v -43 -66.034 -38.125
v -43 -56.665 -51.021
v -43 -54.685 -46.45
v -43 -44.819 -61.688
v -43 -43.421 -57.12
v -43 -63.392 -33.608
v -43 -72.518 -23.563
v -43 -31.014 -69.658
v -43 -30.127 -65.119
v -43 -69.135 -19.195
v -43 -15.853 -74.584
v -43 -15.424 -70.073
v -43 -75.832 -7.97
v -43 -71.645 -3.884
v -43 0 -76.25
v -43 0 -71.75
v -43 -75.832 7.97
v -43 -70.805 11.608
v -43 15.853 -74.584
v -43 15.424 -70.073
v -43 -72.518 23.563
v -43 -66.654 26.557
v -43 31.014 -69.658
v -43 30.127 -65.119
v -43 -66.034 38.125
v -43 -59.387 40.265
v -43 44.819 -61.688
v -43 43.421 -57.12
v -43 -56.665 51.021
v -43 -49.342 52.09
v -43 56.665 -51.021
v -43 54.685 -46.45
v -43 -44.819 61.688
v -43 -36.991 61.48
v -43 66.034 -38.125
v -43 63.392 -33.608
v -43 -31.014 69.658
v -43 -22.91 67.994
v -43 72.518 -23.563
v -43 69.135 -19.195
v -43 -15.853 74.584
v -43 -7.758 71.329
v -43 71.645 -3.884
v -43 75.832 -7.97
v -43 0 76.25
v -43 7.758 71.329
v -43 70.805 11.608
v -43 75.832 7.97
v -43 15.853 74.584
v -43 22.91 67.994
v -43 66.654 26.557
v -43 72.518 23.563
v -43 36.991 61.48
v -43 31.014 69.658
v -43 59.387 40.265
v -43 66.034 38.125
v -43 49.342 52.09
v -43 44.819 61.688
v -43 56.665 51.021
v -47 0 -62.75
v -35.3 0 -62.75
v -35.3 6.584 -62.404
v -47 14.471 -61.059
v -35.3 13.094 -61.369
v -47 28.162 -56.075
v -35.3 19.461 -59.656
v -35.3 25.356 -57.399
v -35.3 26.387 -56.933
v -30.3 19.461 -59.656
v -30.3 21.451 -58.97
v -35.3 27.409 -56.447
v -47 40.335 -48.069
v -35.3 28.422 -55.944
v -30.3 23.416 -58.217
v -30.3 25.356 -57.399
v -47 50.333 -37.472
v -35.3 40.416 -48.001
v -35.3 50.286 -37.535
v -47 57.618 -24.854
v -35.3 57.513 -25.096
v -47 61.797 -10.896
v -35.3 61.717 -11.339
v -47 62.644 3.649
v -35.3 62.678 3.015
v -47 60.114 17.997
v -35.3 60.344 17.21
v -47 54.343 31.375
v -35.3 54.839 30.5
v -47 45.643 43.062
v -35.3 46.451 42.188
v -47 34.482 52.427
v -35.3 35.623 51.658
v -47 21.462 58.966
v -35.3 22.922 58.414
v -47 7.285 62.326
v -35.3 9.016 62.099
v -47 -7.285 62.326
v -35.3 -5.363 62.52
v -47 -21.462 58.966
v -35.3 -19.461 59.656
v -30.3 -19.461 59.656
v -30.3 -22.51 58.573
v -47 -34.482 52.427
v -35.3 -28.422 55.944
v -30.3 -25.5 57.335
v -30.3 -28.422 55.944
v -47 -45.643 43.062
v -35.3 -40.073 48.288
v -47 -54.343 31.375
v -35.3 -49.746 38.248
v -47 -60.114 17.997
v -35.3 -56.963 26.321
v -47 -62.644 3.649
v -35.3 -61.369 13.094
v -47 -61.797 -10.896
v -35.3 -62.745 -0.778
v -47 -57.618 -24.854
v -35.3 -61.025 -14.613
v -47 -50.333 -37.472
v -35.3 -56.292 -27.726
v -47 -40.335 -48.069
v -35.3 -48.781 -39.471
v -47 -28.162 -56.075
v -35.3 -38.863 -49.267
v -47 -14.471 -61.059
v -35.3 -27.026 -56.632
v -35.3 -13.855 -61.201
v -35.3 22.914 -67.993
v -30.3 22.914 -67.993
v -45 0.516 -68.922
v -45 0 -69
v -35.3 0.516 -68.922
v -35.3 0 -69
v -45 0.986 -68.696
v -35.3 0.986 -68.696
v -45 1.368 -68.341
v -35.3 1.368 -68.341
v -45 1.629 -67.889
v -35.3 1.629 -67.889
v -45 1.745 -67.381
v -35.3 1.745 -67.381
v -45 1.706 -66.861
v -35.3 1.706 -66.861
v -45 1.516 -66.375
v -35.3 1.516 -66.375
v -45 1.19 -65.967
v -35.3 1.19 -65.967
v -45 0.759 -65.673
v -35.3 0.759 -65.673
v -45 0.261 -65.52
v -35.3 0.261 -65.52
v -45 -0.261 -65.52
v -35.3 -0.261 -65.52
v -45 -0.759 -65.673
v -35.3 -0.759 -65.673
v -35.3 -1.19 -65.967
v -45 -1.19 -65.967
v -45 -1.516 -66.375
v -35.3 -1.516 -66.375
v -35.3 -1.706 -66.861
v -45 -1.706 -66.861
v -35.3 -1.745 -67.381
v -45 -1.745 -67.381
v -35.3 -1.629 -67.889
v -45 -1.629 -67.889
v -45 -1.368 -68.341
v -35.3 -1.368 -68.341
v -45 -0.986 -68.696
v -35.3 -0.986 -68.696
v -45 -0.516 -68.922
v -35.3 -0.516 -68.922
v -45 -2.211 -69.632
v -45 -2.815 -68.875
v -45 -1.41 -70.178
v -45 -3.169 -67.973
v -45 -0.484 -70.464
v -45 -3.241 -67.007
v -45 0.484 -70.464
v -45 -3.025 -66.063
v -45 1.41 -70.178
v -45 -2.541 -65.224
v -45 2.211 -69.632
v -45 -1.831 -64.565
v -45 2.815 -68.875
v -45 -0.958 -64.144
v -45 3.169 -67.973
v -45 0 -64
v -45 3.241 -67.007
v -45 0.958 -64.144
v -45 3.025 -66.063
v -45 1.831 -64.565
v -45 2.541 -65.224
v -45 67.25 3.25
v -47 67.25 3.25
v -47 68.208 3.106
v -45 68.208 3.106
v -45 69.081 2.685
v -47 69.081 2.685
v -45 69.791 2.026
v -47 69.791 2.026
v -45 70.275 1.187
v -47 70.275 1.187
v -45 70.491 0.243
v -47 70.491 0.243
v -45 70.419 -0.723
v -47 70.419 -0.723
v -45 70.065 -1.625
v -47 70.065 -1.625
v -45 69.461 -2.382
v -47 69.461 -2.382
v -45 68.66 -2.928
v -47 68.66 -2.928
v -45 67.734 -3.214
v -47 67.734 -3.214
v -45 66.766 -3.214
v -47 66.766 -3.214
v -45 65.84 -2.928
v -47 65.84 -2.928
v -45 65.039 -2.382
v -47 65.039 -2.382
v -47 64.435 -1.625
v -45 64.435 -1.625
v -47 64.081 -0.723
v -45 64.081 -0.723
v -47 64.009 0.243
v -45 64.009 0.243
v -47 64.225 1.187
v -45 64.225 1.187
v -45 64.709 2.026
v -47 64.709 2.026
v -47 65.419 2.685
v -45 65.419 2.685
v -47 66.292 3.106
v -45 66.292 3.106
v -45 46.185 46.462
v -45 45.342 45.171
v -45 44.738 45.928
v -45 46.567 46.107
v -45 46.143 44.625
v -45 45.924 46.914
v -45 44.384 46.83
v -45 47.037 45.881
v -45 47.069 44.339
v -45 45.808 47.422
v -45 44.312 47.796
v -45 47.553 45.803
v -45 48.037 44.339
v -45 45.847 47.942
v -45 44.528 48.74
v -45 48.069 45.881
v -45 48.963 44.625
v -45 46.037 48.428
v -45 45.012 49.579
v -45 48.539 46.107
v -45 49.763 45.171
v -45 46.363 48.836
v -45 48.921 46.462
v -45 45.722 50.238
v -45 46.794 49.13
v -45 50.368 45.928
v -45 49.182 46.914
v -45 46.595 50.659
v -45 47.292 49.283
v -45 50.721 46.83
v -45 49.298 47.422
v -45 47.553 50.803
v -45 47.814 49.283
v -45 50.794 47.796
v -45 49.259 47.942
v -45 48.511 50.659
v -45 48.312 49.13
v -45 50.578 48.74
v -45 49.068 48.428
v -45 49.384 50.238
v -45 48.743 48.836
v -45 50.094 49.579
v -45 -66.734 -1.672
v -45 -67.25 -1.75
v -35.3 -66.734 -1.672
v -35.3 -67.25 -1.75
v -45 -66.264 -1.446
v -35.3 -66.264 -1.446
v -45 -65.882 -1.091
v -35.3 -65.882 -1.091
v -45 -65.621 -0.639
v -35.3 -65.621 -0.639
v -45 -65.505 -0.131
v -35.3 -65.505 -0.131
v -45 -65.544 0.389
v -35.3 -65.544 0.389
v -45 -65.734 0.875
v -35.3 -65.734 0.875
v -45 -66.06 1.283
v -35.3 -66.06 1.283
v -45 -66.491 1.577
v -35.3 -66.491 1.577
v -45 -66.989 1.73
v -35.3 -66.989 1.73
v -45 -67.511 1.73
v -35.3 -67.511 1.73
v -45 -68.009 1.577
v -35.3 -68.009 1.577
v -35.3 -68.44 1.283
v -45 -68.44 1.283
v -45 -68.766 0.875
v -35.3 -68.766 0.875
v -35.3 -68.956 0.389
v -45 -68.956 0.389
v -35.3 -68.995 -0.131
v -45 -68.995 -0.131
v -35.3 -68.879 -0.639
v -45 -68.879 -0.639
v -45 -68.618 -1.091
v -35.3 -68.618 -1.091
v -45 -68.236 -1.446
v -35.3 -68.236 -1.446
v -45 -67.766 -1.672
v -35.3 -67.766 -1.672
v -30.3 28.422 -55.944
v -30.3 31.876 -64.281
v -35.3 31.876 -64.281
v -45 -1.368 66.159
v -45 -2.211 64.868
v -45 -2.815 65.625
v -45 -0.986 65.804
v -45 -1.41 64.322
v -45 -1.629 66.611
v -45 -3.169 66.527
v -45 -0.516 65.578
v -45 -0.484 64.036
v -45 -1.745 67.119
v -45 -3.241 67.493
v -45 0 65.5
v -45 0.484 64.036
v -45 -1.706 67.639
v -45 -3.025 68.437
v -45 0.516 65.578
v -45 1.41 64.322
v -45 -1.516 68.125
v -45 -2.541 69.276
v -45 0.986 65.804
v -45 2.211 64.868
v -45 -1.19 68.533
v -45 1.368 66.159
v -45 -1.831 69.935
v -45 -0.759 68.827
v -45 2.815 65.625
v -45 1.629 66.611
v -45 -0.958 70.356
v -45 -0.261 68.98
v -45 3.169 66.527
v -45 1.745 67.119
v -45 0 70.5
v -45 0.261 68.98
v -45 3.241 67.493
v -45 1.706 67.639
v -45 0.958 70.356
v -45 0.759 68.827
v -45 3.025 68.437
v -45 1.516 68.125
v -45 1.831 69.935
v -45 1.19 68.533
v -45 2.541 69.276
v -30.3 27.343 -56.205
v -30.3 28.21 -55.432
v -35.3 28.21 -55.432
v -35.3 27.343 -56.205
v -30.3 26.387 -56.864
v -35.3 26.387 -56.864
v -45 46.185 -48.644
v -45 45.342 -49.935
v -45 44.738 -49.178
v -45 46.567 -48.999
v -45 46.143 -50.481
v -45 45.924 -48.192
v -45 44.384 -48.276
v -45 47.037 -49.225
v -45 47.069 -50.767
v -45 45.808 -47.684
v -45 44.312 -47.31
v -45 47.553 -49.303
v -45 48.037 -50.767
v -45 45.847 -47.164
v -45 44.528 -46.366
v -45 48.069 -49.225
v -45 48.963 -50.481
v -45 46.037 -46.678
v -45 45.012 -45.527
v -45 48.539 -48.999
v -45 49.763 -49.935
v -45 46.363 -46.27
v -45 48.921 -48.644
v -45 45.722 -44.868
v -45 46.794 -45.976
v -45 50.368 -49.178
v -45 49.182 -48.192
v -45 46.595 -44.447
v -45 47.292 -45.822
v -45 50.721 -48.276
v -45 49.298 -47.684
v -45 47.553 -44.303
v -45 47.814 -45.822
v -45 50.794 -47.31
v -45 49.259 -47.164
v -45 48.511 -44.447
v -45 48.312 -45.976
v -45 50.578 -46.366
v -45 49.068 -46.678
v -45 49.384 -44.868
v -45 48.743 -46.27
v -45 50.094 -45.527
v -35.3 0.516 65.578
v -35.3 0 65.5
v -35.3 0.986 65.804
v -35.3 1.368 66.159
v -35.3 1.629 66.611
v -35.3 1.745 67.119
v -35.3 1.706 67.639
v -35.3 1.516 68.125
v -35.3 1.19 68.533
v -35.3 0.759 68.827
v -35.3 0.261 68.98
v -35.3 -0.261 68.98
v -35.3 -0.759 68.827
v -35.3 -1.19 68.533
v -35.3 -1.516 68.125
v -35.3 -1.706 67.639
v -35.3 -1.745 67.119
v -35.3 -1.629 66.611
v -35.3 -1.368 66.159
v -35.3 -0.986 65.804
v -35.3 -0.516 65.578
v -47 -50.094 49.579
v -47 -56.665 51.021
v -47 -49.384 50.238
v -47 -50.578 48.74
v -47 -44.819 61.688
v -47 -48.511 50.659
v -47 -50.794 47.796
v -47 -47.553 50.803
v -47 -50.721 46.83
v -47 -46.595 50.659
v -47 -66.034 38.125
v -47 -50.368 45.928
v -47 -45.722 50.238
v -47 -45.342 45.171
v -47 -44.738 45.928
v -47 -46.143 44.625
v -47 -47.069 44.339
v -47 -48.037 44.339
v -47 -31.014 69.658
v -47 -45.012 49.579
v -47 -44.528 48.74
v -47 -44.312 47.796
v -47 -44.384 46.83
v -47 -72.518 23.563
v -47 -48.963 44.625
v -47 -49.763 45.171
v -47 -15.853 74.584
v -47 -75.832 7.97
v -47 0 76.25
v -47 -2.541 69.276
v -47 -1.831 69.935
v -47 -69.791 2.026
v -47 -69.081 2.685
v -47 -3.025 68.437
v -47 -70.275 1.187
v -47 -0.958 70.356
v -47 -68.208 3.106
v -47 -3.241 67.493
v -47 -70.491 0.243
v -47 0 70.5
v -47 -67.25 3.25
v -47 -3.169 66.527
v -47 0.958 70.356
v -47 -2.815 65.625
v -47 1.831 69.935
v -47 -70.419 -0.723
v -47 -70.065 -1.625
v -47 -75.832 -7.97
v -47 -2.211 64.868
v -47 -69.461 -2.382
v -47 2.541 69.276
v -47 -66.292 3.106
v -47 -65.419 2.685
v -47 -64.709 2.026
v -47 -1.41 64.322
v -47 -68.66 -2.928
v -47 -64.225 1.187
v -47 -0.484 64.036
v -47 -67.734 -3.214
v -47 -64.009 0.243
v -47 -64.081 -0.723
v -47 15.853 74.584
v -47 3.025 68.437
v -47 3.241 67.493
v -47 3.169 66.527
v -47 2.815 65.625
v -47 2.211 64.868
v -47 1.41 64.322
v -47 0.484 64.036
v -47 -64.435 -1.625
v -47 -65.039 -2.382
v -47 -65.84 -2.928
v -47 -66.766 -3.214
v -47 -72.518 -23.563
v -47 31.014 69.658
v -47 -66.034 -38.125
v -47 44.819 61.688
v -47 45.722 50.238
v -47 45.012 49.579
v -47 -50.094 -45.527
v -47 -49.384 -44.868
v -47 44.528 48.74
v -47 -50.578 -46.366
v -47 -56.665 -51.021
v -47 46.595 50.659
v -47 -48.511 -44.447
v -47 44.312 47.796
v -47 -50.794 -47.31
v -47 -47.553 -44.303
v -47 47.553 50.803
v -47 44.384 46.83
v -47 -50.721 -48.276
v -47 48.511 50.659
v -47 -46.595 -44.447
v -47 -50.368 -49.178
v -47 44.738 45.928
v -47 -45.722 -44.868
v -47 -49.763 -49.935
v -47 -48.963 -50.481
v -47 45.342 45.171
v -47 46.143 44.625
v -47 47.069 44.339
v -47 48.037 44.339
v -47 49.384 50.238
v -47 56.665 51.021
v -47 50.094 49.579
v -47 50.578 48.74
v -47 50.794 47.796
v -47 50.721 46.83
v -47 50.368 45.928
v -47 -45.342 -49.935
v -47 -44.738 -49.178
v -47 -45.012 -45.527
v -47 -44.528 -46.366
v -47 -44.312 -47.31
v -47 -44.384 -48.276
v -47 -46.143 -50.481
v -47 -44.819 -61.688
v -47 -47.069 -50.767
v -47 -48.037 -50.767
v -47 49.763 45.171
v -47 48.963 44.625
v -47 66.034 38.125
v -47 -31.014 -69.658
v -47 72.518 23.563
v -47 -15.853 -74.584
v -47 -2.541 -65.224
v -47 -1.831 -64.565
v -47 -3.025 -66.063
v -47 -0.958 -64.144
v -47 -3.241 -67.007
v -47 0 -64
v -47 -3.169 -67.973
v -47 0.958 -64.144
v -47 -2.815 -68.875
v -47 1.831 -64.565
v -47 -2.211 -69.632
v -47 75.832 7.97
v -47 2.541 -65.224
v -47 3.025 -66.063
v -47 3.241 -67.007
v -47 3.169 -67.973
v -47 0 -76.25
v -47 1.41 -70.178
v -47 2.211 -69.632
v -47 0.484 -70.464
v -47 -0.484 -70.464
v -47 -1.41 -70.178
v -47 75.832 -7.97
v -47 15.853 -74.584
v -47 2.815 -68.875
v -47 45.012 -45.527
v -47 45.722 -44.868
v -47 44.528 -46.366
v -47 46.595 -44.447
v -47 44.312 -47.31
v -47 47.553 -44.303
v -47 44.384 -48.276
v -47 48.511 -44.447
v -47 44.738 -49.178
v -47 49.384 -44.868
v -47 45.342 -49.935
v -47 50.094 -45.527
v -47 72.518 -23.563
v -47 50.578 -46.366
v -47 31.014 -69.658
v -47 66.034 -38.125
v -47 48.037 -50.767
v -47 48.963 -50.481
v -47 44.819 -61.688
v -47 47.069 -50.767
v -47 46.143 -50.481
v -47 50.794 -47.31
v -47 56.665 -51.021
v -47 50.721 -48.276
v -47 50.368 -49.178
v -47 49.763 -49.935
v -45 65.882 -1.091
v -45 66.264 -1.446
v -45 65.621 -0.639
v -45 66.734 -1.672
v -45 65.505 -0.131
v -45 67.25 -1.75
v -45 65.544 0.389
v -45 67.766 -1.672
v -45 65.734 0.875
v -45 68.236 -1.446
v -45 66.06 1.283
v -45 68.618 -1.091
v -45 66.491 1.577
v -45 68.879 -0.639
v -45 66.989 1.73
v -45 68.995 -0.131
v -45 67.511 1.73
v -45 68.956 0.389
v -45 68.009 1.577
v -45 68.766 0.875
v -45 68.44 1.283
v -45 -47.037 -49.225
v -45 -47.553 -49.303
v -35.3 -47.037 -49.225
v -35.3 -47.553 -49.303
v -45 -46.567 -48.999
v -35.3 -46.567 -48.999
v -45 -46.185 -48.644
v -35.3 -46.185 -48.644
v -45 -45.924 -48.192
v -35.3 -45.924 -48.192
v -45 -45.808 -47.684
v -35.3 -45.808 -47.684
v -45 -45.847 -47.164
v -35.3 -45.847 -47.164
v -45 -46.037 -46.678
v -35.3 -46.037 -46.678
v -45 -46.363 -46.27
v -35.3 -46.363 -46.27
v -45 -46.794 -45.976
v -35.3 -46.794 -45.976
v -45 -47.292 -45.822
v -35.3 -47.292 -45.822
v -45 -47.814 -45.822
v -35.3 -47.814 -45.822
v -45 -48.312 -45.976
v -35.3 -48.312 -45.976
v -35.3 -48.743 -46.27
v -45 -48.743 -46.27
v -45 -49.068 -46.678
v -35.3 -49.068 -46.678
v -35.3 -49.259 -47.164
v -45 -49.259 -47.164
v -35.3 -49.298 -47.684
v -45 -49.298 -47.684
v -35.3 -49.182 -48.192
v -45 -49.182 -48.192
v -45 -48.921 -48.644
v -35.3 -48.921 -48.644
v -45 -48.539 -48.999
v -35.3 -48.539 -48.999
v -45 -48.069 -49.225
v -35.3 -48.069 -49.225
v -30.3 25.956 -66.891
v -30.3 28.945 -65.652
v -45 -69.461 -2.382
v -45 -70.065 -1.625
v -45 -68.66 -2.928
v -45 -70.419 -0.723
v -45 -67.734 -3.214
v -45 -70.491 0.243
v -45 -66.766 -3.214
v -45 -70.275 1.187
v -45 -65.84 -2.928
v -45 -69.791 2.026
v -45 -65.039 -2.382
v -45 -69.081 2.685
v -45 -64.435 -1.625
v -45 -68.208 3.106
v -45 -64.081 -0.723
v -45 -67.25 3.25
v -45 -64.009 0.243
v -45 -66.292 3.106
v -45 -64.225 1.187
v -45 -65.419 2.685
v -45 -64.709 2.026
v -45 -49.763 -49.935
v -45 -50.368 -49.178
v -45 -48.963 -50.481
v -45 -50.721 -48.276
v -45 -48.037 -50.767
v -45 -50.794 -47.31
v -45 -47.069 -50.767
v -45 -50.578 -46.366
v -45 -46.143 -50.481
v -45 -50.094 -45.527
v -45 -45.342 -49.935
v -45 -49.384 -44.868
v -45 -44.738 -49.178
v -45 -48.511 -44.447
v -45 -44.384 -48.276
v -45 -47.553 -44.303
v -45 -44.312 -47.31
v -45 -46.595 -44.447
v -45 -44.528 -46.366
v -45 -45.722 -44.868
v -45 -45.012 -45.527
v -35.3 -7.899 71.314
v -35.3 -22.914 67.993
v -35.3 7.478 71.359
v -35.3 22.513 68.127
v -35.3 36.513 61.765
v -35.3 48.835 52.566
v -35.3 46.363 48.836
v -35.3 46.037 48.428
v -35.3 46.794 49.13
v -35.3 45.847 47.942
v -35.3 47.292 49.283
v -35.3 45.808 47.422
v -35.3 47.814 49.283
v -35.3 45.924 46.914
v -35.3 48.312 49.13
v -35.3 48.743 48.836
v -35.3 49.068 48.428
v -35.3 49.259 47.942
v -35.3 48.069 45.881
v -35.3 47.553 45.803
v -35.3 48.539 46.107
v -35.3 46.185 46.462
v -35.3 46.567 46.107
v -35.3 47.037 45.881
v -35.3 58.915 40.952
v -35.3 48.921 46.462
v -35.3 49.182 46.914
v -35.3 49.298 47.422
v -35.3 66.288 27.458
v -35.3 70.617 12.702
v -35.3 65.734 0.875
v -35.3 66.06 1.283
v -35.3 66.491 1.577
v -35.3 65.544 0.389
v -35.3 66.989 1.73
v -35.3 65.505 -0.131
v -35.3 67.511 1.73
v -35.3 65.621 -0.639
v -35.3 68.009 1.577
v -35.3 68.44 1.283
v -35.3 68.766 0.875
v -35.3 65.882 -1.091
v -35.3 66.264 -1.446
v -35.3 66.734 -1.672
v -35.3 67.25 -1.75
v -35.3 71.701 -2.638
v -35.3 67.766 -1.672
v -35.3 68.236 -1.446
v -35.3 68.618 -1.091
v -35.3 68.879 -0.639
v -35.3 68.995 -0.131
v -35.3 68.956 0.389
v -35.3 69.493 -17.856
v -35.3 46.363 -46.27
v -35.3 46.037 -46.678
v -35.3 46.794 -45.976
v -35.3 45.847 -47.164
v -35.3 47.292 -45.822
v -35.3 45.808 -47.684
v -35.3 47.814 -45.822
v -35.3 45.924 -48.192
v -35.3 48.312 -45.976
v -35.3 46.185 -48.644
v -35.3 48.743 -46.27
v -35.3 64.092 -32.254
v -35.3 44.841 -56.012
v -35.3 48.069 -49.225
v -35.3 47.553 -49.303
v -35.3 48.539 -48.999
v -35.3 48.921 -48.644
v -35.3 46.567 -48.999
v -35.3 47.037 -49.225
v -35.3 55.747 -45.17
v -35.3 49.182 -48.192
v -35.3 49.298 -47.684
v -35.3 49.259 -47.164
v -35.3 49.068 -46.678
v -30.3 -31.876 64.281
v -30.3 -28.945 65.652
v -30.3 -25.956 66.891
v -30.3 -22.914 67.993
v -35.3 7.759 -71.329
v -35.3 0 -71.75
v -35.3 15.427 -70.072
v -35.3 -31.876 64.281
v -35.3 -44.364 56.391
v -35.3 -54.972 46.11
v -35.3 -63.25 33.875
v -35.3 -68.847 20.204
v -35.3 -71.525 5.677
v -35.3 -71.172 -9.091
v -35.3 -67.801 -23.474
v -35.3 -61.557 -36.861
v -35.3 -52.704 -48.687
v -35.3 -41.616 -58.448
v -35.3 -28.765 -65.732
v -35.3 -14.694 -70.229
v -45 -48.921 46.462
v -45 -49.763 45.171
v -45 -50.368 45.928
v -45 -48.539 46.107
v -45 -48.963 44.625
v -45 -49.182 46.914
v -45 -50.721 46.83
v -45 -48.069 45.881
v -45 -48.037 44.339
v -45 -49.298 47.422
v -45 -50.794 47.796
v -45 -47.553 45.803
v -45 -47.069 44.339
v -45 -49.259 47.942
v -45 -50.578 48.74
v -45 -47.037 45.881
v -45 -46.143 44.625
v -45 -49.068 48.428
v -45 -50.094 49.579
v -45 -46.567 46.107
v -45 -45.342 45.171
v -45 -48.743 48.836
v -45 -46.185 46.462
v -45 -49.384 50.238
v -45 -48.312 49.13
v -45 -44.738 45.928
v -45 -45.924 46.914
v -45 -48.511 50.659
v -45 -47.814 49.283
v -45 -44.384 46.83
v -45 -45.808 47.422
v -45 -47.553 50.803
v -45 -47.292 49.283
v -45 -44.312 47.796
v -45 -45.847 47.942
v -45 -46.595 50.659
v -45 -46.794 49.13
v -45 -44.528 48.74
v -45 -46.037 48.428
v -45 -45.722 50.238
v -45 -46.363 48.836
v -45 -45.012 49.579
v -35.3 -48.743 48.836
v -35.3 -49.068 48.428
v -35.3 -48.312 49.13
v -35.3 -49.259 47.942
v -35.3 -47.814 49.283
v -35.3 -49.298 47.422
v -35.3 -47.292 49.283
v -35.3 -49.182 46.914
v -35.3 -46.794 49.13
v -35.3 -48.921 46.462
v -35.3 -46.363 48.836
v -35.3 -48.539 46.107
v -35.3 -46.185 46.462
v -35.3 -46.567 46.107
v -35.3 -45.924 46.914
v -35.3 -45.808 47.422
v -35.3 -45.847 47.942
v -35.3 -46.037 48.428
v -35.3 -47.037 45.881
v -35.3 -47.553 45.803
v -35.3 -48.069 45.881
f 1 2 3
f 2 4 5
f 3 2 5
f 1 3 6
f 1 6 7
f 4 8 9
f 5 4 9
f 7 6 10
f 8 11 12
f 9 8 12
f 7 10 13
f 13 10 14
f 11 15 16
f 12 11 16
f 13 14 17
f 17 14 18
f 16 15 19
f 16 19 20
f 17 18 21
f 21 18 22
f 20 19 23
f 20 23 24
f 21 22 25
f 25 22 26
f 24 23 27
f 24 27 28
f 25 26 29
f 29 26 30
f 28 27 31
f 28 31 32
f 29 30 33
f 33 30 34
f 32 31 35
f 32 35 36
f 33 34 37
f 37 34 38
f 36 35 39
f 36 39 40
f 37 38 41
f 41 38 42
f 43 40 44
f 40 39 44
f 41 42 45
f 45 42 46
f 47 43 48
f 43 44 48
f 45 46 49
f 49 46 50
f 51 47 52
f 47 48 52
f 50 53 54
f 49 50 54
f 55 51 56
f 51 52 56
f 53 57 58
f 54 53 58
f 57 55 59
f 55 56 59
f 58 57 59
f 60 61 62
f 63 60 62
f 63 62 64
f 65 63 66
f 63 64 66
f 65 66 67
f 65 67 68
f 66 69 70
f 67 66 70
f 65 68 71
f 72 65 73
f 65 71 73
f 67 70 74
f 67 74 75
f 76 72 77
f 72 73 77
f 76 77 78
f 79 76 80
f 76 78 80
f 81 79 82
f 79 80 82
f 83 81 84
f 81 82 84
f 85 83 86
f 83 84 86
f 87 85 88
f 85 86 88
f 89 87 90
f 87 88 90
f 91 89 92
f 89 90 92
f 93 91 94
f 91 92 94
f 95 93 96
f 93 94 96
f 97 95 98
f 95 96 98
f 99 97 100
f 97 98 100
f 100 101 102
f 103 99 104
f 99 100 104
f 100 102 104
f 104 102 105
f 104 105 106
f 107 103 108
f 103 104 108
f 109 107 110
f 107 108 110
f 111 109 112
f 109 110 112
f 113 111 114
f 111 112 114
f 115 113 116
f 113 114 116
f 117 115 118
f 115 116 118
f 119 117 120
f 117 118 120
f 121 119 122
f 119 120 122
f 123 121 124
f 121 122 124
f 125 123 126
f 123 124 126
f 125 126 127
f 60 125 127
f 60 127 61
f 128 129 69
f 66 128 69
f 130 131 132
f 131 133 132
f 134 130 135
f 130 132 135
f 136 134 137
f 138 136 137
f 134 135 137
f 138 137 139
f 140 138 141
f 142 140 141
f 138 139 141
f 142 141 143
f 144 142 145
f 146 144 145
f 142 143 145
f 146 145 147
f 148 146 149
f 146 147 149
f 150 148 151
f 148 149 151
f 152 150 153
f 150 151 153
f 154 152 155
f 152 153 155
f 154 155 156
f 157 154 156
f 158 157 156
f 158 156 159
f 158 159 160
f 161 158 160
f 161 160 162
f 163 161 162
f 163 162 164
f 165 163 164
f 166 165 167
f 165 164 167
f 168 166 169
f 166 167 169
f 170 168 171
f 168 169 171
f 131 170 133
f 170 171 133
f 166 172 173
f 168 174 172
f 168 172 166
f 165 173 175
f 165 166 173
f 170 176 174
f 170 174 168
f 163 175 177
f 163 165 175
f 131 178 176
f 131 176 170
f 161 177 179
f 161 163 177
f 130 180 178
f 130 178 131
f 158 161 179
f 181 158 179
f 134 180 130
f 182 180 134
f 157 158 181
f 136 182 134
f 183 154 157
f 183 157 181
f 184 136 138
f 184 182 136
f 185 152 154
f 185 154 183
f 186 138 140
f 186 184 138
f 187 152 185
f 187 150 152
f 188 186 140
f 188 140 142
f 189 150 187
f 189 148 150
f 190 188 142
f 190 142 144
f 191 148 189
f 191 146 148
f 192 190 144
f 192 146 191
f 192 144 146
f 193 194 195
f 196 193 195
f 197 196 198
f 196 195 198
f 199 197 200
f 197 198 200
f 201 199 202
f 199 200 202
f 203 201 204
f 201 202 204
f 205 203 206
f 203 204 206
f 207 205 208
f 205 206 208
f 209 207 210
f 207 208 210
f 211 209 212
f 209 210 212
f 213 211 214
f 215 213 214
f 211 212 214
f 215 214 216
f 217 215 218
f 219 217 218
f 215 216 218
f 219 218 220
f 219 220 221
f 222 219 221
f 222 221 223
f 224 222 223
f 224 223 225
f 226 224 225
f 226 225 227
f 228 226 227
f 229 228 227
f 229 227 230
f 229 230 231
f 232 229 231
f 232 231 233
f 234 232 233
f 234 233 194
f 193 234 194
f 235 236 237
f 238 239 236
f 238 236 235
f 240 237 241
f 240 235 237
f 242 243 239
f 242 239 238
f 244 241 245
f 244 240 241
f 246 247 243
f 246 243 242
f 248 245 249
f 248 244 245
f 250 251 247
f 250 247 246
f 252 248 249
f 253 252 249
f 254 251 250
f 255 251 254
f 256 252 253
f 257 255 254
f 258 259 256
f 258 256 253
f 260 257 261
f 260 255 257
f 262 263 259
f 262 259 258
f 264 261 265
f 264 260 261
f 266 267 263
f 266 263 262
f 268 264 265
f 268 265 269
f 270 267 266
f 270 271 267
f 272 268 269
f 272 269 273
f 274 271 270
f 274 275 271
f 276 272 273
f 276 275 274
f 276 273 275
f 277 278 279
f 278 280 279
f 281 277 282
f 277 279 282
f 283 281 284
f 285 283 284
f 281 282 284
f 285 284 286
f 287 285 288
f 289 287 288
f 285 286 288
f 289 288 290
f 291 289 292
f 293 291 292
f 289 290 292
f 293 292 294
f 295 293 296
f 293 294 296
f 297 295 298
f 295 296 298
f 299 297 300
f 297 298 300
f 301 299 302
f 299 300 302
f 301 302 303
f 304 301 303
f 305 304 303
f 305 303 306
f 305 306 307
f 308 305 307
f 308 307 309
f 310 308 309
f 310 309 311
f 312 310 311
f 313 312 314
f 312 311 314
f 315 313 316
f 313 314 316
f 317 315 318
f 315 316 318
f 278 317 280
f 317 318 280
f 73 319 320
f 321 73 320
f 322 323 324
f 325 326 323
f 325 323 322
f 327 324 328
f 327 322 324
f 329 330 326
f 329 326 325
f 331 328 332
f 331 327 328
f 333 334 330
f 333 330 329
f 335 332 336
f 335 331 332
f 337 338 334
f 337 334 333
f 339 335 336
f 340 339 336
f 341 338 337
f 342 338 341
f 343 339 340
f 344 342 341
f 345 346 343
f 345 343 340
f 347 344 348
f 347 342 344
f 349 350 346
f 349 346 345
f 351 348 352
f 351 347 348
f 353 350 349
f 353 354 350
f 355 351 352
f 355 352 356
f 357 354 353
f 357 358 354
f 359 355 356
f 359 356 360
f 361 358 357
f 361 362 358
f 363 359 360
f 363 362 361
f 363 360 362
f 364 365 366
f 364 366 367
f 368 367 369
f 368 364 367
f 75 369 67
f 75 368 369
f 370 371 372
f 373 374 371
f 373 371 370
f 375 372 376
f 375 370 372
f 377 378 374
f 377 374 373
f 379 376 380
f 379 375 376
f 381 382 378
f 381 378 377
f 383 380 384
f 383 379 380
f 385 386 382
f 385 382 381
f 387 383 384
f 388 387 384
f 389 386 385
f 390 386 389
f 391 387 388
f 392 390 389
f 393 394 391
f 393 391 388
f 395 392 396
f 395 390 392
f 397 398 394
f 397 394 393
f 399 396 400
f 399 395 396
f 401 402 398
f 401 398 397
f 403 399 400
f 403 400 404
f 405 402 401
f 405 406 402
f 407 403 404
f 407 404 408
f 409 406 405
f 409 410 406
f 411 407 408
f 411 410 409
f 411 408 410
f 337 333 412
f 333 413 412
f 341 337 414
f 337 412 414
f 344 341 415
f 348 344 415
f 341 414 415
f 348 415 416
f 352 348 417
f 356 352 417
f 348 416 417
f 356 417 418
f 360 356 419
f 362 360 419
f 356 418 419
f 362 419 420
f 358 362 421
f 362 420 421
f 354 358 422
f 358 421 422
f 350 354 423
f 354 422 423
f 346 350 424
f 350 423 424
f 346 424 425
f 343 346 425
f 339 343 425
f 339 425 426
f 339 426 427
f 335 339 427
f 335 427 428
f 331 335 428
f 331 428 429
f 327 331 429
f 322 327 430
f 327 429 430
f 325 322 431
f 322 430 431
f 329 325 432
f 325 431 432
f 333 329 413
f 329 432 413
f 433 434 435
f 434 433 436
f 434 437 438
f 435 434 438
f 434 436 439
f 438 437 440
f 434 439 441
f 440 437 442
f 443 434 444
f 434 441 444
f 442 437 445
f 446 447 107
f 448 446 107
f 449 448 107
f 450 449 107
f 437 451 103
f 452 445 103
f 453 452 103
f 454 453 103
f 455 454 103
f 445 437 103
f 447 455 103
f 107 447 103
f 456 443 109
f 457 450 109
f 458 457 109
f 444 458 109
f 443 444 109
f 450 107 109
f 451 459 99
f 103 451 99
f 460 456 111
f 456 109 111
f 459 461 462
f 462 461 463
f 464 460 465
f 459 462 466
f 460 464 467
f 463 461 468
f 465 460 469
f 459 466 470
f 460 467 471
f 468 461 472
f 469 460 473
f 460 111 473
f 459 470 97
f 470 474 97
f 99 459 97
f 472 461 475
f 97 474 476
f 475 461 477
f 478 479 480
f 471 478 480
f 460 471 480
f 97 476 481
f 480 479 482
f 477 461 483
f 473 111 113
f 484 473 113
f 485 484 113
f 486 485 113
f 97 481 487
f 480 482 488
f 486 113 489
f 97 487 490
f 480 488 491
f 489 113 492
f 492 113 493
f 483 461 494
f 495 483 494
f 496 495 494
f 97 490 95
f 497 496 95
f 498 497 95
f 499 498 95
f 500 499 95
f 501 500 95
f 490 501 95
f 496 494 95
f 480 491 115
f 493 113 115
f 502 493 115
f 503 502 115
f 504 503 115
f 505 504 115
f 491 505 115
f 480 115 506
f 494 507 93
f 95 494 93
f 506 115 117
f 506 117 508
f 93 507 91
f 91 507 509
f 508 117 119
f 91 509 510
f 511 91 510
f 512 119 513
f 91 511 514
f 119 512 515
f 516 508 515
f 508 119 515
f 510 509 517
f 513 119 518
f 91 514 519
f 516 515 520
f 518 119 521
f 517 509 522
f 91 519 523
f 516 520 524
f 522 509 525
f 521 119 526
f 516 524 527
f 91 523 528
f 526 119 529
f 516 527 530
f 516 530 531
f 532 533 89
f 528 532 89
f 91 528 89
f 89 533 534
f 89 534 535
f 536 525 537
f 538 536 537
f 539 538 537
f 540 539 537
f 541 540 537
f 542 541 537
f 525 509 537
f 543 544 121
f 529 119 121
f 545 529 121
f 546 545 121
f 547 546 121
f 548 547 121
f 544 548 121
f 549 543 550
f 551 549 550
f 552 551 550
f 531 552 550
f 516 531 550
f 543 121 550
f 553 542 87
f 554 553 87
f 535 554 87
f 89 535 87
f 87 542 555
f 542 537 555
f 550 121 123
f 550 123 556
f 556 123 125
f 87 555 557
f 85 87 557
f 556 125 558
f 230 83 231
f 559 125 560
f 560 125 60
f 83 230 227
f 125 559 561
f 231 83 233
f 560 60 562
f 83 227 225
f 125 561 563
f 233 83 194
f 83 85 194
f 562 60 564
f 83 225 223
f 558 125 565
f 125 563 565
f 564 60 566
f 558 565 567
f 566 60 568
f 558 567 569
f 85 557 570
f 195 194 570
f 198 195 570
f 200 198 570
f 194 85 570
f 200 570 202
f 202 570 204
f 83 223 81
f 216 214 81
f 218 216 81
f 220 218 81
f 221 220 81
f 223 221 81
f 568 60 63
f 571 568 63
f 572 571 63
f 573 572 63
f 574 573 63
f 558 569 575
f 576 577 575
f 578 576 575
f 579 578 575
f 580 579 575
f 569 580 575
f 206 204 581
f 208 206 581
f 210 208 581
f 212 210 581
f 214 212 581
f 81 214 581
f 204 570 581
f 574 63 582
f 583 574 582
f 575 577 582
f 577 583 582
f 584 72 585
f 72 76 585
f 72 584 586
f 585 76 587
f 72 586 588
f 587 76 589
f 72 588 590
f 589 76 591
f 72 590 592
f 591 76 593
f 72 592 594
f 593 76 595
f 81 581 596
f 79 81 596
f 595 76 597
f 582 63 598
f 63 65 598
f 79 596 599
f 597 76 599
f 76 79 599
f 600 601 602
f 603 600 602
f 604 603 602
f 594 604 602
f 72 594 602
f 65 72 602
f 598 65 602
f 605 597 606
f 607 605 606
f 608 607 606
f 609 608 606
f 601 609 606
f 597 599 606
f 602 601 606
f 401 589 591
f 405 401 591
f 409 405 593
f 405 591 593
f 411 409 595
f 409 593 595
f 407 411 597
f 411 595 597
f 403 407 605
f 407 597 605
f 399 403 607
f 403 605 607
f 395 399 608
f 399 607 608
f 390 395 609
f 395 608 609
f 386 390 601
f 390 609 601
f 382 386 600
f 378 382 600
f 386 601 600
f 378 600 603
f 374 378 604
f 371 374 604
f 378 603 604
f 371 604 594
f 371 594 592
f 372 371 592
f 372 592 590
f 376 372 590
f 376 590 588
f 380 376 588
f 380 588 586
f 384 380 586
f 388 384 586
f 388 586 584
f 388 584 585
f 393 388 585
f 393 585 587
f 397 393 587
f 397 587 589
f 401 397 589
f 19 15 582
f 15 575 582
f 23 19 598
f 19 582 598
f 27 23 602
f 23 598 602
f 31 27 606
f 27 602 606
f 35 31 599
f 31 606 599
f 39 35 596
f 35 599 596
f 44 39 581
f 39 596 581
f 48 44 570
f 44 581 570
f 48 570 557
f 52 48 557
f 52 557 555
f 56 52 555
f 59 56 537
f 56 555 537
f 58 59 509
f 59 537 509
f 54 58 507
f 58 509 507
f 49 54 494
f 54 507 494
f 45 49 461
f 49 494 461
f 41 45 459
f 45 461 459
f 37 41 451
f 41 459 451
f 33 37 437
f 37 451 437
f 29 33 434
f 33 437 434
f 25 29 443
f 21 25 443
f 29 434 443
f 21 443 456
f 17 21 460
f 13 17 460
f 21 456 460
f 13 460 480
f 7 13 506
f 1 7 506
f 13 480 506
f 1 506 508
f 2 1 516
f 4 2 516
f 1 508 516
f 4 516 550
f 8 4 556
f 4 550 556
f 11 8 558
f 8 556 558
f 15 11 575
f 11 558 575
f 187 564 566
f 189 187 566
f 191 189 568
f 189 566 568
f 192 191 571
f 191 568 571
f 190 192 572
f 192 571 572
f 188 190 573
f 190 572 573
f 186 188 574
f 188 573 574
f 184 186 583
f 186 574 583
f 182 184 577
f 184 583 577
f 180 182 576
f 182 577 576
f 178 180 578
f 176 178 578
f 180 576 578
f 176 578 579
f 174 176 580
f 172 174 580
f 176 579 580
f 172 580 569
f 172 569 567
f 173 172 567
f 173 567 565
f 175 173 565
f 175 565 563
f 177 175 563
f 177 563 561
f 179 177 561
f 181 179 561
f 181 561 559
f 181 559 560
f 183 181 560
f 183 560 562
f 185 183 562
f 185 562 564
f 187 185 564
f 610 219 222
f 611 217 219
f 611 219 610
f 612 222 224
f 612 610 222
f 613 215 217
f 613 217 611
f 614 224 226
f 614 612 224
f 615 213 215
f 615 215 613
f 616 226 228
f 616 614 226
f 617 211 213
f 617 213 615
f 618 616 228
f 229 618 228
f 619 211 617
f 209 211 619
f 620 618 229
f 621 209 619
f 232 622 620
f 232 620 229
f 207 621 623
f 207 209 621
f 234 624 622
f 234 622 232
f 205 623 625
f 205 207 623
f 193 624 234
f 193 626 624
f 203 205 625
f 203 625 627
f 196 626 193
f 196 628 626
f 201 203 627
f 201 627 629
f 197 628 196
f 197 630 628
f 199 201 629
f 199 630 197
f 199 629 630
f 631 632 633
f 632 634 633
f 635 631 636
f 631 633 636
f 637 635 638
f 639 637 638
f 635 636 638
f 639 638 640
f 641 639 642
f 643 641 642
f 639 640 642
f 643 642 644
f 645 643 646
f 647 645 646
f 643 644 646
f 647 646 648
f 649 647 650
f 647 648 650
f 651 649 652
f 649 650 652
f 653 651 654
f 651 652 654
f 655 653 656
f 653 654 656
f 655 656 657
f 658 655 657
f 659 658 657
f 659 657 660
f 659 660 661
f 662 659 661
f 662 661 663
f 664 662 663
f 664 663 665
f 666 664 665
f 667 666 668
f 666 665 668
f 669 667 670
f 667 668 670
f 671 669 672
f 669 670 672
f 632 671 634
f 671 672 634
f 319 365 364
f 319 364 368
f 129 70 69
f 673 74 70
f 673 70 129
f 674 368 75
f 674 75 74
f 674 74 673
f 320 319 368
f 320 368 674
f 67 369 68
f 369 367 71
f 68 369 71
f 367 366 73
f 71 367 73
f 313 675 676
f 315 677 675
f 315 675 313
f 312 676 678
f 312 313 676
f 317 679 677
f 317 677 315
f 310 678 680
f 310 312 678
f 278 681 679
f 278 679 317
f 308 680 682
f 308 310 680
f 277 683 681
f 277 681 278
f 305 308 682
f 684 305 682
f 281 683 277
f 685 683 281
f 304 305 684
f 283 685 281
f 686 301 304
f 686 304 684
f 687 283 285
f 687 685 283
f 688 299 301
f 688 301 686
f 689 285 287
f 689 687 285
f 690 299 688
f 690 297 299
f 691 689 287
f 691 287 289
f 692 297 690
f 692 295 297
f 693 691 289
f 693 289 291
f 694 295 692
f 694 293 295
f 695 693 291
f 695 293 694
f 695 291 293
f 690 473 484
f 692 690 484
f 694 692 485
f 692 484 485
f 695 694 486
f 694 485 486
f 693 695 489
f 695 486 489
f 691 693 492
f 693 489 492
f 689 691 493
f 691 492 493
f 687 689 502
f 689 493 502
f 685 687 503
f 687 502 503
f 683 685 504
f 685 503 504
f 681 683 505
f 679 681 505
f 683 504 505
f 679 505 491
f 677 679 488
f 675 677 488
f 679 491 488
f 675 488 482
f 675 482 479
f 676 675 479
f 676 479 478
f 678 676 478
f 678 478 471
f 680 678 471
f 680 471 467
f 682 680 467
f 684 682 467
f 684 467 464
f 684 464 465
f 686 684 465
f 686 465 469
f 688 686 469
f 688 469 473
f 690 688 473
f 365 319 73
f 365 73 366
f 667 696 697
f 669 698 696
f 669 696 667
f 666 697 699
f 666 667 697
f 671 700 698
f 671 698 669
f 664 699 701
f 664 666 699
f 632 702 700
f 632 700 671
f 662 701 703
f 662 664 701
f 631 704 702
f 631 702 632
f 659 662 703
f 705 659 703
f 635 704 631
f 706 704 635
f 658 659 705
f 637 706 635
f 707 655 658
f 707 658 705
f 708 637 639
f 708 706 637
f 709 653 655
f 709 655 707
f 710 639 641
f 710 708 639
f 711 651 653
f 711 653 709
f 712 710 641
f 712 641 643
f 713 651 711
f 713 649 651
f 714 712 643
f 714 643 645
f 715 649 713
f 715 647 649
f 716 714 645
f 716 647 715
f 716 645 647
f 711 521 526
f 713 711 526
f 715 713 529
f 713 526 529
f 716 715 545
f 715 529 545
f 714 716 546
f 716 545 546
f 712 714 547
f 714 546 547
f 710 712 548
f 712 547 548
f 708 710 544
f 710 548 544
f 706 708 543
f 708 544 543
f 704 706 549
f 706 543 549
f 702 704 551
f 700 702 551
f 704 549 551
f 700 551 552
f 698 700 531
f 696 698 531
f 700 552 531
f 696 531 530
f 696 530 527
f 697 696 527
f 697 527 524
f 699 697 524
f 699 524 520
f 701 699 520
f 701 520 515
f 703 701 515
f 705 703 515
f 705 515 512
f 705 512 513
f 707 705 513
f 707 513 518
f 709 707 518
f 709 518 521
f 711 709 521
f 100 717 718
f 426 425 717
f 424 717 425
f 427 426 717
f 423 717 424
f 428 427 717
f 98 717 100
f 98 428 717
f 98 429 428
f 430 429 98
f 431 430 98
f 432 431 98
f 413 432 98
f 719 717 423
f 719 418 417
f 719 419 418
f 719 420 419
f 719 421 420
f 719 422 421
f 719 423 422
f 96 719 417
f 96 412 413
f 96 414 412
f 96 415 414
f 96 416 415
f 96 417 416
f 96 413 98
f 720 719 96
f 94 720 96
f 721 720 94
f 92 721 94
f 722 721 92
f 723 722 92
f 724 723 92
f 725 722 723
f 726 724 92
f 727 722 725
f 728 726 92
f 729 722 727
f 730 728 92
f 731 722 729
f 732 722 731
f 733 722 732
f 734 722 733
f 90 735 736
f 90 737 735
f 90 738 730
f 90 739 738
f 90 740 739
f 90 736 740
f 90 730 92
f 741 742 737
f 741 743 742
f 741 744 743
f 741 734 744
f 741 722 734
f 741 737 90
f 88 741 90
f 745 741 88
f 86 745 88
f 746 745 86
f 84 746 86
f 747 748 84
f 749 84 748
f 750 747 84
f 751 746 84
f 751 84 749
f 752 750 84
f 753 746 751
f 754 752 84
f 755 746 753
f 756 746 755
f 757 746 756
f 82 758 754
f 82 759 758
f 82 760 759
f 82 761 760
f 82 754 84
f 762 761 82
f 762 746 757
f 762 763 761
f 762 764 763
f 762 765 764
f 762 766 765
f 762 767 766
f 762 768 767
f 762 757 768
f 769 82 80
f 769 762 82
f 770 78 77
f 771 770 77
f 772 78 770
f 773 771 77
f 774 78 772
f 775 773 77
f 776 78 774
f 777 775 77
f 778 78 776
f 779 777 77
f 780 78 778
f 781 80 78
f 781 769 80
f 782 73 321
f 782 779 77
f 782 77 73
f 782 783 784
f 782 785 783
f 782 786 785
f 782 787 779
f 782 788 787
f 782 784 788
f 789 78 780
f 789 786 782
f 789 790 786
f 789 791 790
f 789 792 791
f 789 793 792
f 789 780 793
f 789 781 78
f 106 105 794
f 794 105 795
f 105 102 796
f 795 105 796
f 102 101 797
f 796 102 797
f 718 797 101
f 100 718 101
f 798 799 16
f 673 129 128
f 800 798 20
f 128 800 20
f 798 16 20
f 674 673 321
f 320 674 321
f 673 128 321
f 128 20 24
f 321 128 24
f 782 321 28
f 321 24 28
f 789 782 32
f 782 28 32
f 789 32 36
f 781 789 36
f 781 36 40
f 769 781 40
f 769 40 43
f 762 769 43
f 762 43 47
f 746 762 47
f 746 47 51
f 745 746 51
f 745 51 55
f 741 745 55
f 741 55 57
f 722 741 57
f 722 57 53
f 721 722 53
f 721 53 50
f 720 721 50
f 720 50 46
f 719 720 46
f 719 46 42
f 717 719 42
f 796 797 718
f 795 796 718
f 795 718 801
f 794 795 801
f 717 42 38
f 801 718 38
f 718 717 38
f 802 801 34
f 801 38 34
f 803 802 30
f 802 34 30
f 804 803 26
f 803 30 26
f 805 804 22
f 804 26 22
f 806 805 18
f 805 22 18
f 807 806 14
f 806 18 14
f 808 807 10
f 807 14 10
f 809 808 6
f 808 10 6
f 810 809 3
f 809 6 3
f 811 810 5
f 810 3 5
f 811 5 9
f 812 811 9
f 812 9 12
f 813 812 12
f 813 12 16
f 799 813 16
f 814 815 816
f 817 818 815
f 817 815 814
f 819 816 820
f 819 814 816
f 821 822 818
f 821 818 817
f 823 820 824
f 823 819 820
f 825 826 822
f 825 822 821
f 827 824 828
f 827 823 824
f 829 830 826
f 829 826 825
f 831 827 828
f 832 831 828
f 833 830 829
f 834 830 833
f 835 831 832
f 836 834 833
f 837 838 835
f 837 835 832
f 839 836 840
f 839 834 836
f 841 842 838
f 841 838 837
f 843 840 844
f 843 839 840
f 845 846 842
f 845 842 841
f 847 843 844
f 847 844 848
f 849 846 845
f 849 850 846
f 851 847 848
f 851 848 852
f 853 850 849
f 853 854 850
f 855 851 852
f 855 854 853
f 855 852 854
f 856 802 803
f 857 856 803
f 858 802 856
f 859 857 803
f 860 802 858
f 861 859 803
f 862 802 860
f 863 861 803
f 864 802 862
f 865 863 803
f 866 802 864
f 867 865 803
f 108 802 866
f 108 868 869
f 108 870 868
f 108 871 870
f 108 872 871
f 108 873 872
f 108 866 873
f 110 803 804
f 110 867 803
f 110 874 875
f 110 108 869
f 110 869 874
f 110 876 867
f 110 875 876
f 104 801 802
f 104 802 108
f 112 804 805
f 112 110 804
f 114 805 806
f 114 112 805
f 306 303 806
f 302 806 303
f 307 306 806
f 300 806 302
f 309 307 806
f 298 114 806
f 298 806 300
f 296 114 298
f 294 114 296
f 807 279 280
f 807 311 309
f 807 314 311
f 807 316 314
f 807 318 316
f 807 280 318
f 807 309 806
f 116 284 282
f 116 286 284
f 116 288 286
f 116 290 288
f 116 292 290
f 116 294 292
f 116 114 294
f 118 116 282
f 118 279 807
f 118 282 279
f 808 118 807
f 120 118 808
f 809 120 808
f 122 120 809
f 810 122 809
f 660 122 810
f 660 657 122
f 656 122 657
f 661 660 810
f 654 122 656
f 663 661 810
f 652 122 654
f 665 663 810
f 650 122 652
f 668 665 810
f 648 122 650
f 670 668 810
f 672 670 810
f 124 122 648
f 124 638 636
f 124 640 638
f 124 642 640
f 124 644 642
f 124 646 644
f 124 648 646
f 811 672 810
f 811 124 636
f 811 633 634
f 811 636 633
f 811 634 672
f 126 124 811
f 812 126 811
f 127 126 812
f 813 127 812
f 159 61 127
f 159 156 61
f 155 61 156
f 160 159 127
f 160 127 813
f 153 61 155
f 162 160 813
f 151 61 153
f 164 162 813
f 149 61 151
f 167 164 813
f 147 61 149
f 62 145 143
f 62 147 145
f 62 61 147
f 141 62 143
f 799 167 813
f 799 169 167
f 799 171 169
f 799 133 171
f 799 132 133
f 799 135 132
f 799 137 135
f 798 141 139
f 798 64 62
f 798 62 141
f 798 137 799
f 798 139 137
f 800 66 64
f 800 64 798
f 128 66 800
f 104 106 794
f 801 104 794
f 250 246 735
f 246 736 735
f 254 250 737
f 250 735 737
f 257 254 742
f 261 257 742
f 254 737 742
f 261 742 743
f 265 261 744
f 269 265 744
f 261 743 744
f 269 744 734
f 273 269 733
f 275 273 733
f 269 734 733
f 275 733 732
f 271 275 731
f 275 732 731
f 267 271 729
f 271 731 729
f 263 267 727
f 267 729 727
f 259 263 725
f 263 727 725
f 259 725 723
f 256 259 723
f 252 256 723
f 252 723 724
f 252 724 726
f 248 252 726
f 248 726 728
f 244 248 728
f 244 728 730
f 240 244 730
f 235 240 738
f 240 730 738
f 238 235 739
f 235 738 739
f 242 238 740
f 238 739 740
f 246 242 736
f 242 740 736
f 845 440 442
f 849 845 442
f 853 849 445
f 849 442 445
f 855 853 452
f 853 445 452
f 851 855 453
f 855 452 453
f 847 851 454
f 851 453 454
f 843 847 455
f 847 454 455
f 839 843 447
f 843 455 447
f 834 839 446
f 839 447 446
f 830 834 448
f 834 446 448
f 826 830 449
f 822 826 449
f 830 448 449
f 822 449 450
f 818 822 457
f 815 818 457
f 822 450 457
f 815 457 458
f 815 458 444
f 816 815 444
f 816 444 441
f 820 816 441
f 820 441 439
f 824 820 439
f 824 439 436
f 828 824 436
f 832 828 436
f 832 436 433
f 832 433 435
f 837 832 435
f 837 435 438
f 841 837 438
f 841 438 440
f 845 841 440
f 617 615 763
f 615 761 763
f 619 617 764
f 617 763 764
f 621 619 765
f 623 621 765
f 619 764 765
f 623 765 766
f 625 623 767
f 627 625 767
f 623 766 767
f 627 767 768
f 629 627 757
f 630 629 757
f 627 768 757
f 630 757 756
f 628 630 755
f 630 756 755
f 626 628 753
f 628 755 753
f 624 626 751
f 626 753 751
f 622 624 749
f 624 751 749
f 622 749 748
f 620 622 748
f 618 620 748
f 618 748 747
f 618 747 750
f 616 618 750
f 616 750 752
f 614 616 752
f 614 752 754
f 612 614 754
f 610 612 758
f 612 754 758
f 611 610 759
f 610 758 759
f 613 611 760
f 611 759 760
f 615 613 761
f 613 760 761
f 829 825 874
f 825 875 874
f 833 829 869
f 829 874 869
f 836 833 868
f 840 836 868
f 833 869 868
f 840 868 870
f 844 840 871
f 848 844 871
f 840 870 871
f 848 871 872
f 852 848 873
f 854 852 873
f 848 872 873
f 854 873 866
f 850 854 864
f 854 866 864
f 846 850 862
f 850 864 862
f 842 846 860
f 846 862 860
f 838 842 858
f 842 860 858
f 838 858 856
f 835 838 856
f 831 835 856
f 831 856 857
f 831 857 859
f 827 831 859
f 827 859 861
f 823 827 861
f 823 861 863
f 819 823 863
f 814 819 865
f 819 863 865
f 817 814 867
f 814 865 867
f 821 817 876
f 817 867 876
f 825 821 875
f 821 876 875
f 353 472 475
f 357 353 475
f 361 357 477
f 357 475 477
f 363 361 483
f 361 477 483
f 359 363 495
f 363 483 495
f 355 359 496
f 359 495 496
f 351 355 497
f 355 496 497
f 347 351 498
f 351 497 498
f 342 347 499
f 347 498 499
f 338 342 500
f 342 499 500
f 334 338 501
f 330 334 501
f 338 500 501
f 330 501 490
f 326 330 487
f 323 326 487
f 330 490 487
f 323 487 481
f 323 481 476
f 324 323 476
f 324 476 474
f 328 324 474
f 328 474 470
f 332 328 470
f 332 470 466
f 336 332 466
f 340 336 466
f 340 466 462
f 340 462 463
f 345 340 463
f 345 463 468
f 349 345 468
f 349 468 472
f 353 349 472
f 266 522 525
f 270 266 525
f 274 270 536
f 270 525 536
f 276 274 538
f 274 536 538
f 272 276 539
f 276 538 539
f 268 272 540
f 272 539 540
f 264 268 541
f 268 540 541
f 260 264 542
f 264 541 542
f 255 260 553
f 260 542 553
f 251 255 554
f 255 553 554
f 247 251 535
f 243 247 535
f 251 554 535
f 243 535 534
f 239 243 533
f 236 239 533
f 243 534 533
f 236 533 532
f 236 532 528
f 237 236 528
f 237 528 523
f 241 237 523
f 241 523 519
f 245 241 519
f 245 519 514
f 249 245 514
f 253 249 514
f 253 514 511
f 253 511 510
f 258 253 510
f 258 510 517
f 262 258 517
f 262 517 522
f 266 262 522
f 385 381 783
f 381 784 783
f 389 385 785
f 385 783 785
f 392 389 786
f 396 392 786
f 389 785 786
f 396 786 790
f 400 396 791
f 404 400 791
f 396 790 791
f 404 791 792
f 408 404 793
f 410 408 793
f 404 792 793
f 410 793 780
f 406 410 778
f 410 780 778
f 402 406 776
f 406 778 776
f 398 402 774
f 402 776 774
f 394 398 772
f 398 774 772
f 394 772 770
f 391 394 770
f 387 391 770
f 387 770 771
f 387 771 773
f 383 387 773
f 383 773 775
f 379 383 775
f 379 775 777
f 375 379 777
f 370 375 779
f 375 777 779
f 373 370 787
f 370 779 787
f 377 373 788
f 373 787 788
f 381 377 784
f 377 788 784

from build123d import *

# Parameters (mm, degrees)
CUT_EXTRUDE_1_DEPTH       = 5
CUT_EXTRUDE_2_DEPTH       = 5
EXTRUDE_1_DEPTH           = 5
HOLE_WIZARD_1_D           = 3.5
HOLE_WIZARD_1_DEPTH       = 16.7
HOLE_WIZARD_1_CBORE_D     = 6.5
HOLE_WIZARD_1_CBORE_DEPTH = 2
HOLE_WIZARD_2_D           = 3.5
HOLE_WIZARD_2_DEPTH       = 16.7
HOLE_WIZARD_2_CBORE_D     = 6.5
HOLE_WIZARD_2_CBORE_DEPTH = 2
HOLE_WIZARD_3_D           = 3.5
HOLE_WIZARD_3_DEPTH       = 16.7
HOLE_WIZARD_3_CBORE_D     = 6.5
HOLE_WIZARD_3_CBORE_DEPTH = 2
HOLE_WIZARD_4_D           = 3.5
HOLE_WIZARD_4_DEPTH       = 16.7
HOLE_WIZARD_4_CBORE_D     = 6.5
HOLE_WIZARD_4_CBORE_DEPTH = 2
HOLE_WIZARD_5_D           = 3.5
HOLE_WIZARD_5_DEPTH       = 16.7
HOLE_WIZARD_5_CBORE_D     = 6.5
HOLE_WIZARD_5_CBORE_DEPTH = 2
HOLE_WIZARD_6_D           = 3.5
HOLE_WIZARD_6_DEPTH       = 16.7
HOLE_WIZARD_6_CBORE_D     = 6.5
HOLE_WIZARD_6_CBORE_DEPTH = 2
HOLE_WIZARD_7_D           = 3.5
HOLE_WIZARD_7_DEPTH       = 16.7
HOLE_WIZARD_7_CBORE_D     = 6.5
HOLE_WIZARD_7_CBORE_DEPTH = 2
HOLE_WIZARD_8_D           = 3.5
HOLE_WIZARD_8_DEPTH       = 16.7
HOLE_WIZARD_8_CBORE_D     = 6.5
HOLE_WIZARD_8_CBORE_DEPTH = 2


with BuildPart() as part:
    # 草图2 → 旋转1 (revolve)
    with BuildSketch(Plane.XY, mode=Mode.PRIVATE) as revolve_1_sk:
        Polygon((-30.3, 71.75), (-43, 71.75), (-43, 76.25), (-47, 76.25), (-47, 62.75), (-30.3, 62.75), align=None)
    revolve(revolve_1_sk.sketch.rotate(Axis((-47, 0, 0), (1, 0, 0)), 270), axis=Axis((-47, 0, 0), (1, 0, 0)))

    # 草图3 → 切除-拉伸1 (cut)
    with BuildSketch(Plane(origin=(-30.3, 0, 0), x_dir=(0, 0, -1), z_dir=(1, 0, 0))):
        with BuildLine():
            Line((55.944003631, 28.422367209), (64.280726218, 31.87555077))
            ThreePointArc((64.280726218, 31.87555077), (-27.457536272, 66.288356458), (-67.992755512, -22.913919305))
            Line((-67.992755512, -22.913919305), (-59.656032925, -19.460735743))
            ThreePointArc((-59.656032925, -19.460735743), (-24.013385381, 57.973440665), (55.944003631, 28.422367209))
        make_face()
    extrude(amount=-CUT_EXTRUDE_1_DEPTH, mode=Mode.SUBTRACT)

    # 草图4 → 切除-拉伸2 (cut)
    with BuildSketch(Plane(origin=(-30.3, 0, 0), x_dir=(0, 0, -1), z_dir=(1, 0, 0))):
        with BuildLine():
            Line((-55.944003631, -28.422367209), (-64.280726218, -31.87555077))
            ThreePointArc((-64.280726218, -31.87555077), (27.457536272, -66.288356458), (67.992755512, 22.913919305))
            Line((67.992755512, 22.913919305), (59.656032925, 19.460735743))
            ThreePointArc((59.656032925, 19.460735743), (24.013385381, -57.973440665), (-55.944003631, -28.422367209))
        make_face()
    extrude(amount=-CUT_EXTRUDE_2_DEPTH, mode=Mode.SUBTRACT)

    # 草图5 → 凸台-拉伸1 (add)
    with BuildSketch(Plane(origin=(-30.3, 0, 0), x_dir=(0, 0, -1), z_dir=(1, 0, 0))):
        with BuildLine():
            Line((55.944003631, 28.422367209), (55.431709583, 28.210168066))
            ThreePointArc((55.431709583, 28.210168066), (56.54956954, 26.875405525), (57.39905958, 25.355679036))
            ThreePointArc((57.39905958, 25.355679036), (56.692271418, 26.898863571), (55.944003631, 28.422367209))
        make_face()
    extrude(amount=-EXTRUDE_1_DEPTH)

    # 孔1
    with Locations(Plane.ZY.offset(47)):
        with Locations((-67.25, 0)):
            CounterBoreHole(HOLE_WIZARD_1_D / 2, HOLE_WIZARD_1_CBORE_D / 2, HOLE_WIZARD_1_CBORE_DEPTH, depth=HOLE_WIZARD_1_DEPTH)

    # 孔2
    with Locations(Plane.ZY.offset(47)):
        with Locations((-47.552931035, 47.552931035)):
            CounterBoreHole(HOLE_WIZARD_2_D / 2, HOLE_WIZARD_2_CBORE_D / 2, HOLE_WIZARD_2_CBORE_DEPTH, depth=HOLE_WIZARD_2_DEPTH)

    # 孔3
    with Locations(Plane.ZY.offset(47)):
        with Locations((0, 67.25)):
            CounterBoreHole(HOLE_WIZARD_3_D / 2, HOLE_WIZARD_3_CBORE_D / 2, HOLE_WIZARD_3_CBORE_DEPTH, depth=HOLE_WIZARD_3_DEPTH)

    # 孔4
    with Locations(Plane.ZY.offset(47)):
        with Locations((47.552931035, 47.552931035)):
            CounterBoreHole(HOLE_WIZARD_4_D / 2, HOLE_WIZARD_4_CBORE_D / 2, HOLE_WIZARD_4_CBORE_DEPTH, depth=HOLE_WIZARD_4_DEPTH)

    # 孔5
    with Locations(Plane.ZY.offset(47)):
        with Locations((67.25, 0)):
            CounterBoreHole(HOLE_WIZARD_5_D / 2, HOLE_WIZARD_5_CBORE_D / 2, HOLE_WIZARD_5_CBORE_DEPTH, depth=HOLE_WIZARD_5_DEPTH)

    # 孔6
    with Locations(Plane.ZY.offset(47)):
        with Locations((47.552931035, -47.552931035)):
            CounterBoreHole(HOLE_WIZARD_6_D / 2, HOLE_WIZARD_6_CBORE_D / 2, HOLE_WIZARD_6_CBORE_DEPTH, depth=HOLE_WIZARD_6_DEPTH)

    # 孔7
    with Locations(Plane.ZY.offset(47)):
        with Locations((0, -67.25)):
            CounterBoreHole(HOLE_WIZARD_7_D / 2, HOLE_WIZARD_7_CBORE_D / 2, HOLE_WIZARD_7_CBORE_DEPTH, depth=HOLE_WIZARD_7_DEPTH)

    # 孔8
    with Locations(Plane.ZY.offset(47)):
        with Locations((-47.552931035, -47.552931035)):
            CounterBoreHole(HOLE_WIZARD_8_D / 2, HOLE_WIZARD_8_CBORE_D / 2, HOLE_WIZARD_8_CBORE_DEPTH, depth=HOLE_WIZARD_8_DEPTH)


solid = part.part
